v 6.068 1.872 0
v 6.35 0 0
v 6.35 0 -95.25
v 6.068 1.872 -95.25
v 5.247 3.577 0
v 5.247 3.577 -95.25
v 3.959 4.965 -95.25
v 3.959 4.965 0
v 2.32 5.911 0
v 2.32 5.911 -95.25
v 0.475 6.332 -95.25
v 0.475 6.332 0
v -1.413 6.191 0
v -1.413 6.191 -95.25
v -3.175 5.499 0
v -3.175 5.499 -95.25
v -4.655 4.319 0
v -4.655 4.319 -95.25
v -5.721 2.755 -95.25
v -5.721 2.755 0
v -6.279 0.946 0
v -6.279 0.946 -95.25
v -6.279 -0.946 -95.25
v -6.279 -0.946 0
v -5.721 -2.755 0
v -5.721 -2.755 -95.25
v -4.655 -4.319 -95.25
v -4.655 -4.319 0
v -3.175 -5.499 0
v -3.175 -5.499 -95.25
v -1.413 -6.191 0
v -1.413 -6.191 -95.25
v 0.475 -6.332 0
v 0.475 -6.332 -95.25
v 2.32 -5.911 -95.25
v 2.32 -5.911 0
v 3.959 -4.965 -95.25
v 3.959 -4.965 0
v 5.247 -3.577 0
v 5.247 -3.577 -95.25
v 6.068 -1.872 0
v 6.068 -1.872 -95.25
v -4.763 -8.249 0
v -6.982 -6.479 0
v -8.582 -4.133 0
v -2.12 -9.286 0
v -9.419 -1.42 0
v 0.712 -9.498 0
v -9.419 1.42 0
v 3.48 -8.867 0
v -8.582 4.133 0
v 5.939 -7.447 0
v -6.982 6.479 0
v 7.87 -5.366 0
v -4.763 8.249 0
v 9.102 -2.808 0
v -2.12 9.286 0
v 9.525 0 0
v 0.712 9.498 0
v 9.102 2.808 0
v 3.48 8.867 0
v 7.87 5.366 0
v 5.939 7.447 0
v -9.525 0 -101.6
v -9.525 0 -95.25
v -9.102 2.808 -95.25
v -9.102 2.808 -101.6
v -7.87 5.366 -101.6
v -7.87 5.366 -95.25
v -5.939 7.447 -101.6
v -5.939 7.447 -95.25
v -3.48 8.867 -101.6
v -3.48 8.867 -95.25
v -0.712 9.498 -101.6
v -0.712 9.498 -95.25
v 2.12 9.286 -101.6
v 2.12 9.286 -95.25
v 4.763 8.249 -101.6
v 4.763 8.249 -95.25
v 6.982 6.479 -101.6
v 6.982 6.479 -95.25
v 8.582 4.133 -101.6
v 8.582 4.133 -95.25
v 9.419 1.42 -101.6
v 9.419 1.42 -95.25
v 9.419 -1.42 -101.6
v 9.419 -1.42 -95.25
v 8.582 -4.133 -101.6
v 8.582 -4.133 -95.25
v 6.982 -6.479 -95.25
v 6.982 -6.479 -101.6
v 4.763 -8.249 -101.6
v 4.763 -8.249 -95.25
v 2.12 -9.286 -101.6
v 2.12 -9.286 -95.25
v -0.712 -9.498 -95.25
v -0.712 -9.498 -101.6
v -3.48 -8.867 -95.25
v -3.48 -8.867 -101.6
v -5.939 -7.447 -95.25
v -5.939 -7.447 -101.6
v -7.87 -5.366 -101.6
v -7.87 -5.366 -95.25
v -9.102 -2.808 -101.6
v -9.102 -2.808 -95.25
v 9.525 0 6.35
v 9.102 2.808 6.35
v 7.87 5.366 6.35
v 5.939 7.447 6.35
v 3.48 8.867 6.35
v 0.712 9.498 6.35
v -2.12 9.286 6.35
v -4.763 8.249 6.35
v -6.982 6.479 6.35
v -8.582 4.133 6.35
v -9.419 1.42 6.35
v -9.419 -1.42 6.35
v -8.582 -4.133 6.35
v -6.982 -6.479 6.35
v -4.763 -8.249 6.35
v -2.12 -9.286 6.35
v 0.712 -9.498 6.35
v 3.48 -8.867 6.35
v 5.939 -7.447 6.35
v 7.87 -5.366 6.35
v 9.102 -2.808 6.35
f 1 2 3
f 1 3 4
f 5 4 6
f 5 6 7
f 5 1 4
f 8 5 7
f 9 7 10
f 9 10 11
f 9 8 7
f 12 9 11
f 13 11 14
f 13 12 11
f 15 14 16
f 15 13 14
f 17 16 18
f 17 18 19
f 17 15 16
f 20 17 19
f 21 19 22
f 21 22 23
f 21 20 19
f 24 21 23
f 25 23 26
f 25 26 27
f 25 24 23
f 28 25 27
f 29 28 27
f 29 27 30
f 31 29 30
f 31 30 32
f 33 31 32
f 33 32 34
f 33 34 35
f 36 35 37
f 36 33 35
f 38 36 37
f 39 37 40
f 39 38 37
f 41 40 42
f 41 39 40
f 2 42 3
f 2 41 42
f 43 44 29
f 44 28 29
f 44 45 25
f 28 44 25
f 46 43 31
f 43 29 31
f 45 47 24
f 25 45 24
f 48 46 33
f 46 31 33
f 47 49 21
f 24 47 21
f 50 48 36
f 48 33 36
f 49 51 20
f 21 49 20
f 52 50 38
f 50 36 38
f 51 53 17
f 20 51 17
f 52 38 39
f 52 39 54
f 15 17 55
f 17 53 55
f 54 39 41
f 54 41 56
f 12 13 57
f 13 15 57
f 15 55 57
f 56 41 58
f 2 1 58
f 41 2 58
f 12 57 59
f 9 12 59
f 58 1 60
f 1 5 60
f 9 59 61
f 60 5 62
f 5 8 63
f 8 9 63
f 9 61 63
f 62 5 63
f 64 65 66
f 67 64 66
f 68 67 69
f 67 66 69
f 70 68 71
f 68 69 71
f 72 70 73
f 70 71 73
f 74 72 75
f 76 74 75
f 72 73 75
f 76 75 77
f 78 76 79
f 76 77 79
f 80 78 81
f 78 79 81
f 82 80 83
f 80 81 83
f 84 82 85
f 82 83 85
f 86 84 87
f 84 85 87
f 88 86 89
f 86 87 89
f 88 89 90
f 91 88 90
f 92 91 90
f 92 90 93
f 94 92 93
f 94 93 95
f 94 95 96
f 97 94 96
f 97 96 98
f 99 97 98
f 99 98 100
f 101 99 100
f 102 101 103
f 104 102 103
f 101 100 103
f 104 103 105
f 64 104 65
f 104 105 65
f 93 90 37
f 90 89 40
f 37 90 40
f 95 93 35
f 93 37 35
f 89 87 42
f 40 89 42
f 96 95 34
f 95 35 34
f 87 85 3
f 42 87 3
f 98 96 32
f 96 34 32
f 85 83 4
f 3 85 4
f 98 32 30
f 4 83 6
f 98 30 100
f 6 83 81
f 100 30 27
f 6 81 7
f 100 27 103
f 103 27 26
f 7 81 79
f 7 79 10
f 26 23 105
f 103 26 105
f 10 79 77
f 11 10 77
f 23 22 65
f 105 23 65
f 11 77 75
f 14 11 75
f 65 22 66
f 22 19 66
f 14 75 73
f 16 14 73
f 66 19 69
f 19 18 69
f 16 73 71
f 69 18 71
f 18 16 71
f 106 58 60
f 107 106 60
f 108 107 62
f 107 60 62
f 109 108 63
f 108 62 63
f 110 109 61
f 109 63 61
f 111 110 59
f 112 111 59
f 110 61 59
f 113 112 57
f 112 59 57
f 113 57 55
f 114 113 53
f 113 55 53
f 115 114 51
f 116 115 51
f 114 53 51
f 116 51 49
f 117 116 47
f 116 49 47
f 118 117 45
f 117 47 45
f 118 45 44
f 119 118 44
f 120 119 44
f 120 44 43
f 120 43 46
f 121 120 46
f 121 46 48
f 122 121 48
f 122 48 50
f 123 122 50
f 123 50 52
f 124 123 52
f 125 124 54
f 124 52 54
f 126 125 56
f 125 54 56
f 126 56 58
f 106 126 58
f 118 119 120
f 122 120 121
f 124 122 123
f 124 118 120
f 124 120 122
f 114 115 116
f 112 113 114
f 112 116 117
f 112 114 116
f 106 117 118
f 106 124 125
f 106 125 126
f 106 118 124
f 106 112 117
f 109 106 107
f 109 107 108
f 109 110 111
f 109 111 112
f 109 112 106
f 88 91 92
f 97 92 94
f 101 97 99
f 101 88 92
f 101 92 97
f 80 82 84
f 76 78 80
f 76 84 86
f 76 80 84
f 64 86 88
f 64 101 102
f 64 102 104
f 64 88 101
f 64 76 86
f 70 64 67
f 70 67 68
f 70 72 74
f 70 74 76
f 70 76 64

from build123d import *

# Parameters (mm, degrees)
SKETCH1_R           = 6.35
BOSS_EXTRUDE1_DEPTH = 95.25
SKETCH2_R           = 9.525
BOSS_EXTRUDE2_DEPTH = 6.35
SKETCH3_R           = 9.525
BOSS_EXTRUDE3_DEPTH = 6.35


with BuildPart() as part:
    # Sketch1 → Boss-Extrude1 (new body)
    with BuildSketch(Plane.XY):
        Circle(SKETCH1_R)
    extrude(amount=-BOSS_EXTRUDE1_DEPTH)

    # Sketch2 → Boss-Extrude2 (add)
    with BuildSketch(Plane.XY):
        Circle(SKETCH2_R)
    extrude(amount=BOSS_EXTRUDE2_DEPTH)

    # Sketch3 → Boss-Extrude3 (add)
    with BuildSketch(Plane(origin=(0, 0, -95.25), x_dir=(-1, 0, 0), z_dir=(0, 0, -1))):
        Circle(SKETCH3_R)
    extrude(amount=BOSS_EXTRUDE3_DEPTH)


solid = part.part
